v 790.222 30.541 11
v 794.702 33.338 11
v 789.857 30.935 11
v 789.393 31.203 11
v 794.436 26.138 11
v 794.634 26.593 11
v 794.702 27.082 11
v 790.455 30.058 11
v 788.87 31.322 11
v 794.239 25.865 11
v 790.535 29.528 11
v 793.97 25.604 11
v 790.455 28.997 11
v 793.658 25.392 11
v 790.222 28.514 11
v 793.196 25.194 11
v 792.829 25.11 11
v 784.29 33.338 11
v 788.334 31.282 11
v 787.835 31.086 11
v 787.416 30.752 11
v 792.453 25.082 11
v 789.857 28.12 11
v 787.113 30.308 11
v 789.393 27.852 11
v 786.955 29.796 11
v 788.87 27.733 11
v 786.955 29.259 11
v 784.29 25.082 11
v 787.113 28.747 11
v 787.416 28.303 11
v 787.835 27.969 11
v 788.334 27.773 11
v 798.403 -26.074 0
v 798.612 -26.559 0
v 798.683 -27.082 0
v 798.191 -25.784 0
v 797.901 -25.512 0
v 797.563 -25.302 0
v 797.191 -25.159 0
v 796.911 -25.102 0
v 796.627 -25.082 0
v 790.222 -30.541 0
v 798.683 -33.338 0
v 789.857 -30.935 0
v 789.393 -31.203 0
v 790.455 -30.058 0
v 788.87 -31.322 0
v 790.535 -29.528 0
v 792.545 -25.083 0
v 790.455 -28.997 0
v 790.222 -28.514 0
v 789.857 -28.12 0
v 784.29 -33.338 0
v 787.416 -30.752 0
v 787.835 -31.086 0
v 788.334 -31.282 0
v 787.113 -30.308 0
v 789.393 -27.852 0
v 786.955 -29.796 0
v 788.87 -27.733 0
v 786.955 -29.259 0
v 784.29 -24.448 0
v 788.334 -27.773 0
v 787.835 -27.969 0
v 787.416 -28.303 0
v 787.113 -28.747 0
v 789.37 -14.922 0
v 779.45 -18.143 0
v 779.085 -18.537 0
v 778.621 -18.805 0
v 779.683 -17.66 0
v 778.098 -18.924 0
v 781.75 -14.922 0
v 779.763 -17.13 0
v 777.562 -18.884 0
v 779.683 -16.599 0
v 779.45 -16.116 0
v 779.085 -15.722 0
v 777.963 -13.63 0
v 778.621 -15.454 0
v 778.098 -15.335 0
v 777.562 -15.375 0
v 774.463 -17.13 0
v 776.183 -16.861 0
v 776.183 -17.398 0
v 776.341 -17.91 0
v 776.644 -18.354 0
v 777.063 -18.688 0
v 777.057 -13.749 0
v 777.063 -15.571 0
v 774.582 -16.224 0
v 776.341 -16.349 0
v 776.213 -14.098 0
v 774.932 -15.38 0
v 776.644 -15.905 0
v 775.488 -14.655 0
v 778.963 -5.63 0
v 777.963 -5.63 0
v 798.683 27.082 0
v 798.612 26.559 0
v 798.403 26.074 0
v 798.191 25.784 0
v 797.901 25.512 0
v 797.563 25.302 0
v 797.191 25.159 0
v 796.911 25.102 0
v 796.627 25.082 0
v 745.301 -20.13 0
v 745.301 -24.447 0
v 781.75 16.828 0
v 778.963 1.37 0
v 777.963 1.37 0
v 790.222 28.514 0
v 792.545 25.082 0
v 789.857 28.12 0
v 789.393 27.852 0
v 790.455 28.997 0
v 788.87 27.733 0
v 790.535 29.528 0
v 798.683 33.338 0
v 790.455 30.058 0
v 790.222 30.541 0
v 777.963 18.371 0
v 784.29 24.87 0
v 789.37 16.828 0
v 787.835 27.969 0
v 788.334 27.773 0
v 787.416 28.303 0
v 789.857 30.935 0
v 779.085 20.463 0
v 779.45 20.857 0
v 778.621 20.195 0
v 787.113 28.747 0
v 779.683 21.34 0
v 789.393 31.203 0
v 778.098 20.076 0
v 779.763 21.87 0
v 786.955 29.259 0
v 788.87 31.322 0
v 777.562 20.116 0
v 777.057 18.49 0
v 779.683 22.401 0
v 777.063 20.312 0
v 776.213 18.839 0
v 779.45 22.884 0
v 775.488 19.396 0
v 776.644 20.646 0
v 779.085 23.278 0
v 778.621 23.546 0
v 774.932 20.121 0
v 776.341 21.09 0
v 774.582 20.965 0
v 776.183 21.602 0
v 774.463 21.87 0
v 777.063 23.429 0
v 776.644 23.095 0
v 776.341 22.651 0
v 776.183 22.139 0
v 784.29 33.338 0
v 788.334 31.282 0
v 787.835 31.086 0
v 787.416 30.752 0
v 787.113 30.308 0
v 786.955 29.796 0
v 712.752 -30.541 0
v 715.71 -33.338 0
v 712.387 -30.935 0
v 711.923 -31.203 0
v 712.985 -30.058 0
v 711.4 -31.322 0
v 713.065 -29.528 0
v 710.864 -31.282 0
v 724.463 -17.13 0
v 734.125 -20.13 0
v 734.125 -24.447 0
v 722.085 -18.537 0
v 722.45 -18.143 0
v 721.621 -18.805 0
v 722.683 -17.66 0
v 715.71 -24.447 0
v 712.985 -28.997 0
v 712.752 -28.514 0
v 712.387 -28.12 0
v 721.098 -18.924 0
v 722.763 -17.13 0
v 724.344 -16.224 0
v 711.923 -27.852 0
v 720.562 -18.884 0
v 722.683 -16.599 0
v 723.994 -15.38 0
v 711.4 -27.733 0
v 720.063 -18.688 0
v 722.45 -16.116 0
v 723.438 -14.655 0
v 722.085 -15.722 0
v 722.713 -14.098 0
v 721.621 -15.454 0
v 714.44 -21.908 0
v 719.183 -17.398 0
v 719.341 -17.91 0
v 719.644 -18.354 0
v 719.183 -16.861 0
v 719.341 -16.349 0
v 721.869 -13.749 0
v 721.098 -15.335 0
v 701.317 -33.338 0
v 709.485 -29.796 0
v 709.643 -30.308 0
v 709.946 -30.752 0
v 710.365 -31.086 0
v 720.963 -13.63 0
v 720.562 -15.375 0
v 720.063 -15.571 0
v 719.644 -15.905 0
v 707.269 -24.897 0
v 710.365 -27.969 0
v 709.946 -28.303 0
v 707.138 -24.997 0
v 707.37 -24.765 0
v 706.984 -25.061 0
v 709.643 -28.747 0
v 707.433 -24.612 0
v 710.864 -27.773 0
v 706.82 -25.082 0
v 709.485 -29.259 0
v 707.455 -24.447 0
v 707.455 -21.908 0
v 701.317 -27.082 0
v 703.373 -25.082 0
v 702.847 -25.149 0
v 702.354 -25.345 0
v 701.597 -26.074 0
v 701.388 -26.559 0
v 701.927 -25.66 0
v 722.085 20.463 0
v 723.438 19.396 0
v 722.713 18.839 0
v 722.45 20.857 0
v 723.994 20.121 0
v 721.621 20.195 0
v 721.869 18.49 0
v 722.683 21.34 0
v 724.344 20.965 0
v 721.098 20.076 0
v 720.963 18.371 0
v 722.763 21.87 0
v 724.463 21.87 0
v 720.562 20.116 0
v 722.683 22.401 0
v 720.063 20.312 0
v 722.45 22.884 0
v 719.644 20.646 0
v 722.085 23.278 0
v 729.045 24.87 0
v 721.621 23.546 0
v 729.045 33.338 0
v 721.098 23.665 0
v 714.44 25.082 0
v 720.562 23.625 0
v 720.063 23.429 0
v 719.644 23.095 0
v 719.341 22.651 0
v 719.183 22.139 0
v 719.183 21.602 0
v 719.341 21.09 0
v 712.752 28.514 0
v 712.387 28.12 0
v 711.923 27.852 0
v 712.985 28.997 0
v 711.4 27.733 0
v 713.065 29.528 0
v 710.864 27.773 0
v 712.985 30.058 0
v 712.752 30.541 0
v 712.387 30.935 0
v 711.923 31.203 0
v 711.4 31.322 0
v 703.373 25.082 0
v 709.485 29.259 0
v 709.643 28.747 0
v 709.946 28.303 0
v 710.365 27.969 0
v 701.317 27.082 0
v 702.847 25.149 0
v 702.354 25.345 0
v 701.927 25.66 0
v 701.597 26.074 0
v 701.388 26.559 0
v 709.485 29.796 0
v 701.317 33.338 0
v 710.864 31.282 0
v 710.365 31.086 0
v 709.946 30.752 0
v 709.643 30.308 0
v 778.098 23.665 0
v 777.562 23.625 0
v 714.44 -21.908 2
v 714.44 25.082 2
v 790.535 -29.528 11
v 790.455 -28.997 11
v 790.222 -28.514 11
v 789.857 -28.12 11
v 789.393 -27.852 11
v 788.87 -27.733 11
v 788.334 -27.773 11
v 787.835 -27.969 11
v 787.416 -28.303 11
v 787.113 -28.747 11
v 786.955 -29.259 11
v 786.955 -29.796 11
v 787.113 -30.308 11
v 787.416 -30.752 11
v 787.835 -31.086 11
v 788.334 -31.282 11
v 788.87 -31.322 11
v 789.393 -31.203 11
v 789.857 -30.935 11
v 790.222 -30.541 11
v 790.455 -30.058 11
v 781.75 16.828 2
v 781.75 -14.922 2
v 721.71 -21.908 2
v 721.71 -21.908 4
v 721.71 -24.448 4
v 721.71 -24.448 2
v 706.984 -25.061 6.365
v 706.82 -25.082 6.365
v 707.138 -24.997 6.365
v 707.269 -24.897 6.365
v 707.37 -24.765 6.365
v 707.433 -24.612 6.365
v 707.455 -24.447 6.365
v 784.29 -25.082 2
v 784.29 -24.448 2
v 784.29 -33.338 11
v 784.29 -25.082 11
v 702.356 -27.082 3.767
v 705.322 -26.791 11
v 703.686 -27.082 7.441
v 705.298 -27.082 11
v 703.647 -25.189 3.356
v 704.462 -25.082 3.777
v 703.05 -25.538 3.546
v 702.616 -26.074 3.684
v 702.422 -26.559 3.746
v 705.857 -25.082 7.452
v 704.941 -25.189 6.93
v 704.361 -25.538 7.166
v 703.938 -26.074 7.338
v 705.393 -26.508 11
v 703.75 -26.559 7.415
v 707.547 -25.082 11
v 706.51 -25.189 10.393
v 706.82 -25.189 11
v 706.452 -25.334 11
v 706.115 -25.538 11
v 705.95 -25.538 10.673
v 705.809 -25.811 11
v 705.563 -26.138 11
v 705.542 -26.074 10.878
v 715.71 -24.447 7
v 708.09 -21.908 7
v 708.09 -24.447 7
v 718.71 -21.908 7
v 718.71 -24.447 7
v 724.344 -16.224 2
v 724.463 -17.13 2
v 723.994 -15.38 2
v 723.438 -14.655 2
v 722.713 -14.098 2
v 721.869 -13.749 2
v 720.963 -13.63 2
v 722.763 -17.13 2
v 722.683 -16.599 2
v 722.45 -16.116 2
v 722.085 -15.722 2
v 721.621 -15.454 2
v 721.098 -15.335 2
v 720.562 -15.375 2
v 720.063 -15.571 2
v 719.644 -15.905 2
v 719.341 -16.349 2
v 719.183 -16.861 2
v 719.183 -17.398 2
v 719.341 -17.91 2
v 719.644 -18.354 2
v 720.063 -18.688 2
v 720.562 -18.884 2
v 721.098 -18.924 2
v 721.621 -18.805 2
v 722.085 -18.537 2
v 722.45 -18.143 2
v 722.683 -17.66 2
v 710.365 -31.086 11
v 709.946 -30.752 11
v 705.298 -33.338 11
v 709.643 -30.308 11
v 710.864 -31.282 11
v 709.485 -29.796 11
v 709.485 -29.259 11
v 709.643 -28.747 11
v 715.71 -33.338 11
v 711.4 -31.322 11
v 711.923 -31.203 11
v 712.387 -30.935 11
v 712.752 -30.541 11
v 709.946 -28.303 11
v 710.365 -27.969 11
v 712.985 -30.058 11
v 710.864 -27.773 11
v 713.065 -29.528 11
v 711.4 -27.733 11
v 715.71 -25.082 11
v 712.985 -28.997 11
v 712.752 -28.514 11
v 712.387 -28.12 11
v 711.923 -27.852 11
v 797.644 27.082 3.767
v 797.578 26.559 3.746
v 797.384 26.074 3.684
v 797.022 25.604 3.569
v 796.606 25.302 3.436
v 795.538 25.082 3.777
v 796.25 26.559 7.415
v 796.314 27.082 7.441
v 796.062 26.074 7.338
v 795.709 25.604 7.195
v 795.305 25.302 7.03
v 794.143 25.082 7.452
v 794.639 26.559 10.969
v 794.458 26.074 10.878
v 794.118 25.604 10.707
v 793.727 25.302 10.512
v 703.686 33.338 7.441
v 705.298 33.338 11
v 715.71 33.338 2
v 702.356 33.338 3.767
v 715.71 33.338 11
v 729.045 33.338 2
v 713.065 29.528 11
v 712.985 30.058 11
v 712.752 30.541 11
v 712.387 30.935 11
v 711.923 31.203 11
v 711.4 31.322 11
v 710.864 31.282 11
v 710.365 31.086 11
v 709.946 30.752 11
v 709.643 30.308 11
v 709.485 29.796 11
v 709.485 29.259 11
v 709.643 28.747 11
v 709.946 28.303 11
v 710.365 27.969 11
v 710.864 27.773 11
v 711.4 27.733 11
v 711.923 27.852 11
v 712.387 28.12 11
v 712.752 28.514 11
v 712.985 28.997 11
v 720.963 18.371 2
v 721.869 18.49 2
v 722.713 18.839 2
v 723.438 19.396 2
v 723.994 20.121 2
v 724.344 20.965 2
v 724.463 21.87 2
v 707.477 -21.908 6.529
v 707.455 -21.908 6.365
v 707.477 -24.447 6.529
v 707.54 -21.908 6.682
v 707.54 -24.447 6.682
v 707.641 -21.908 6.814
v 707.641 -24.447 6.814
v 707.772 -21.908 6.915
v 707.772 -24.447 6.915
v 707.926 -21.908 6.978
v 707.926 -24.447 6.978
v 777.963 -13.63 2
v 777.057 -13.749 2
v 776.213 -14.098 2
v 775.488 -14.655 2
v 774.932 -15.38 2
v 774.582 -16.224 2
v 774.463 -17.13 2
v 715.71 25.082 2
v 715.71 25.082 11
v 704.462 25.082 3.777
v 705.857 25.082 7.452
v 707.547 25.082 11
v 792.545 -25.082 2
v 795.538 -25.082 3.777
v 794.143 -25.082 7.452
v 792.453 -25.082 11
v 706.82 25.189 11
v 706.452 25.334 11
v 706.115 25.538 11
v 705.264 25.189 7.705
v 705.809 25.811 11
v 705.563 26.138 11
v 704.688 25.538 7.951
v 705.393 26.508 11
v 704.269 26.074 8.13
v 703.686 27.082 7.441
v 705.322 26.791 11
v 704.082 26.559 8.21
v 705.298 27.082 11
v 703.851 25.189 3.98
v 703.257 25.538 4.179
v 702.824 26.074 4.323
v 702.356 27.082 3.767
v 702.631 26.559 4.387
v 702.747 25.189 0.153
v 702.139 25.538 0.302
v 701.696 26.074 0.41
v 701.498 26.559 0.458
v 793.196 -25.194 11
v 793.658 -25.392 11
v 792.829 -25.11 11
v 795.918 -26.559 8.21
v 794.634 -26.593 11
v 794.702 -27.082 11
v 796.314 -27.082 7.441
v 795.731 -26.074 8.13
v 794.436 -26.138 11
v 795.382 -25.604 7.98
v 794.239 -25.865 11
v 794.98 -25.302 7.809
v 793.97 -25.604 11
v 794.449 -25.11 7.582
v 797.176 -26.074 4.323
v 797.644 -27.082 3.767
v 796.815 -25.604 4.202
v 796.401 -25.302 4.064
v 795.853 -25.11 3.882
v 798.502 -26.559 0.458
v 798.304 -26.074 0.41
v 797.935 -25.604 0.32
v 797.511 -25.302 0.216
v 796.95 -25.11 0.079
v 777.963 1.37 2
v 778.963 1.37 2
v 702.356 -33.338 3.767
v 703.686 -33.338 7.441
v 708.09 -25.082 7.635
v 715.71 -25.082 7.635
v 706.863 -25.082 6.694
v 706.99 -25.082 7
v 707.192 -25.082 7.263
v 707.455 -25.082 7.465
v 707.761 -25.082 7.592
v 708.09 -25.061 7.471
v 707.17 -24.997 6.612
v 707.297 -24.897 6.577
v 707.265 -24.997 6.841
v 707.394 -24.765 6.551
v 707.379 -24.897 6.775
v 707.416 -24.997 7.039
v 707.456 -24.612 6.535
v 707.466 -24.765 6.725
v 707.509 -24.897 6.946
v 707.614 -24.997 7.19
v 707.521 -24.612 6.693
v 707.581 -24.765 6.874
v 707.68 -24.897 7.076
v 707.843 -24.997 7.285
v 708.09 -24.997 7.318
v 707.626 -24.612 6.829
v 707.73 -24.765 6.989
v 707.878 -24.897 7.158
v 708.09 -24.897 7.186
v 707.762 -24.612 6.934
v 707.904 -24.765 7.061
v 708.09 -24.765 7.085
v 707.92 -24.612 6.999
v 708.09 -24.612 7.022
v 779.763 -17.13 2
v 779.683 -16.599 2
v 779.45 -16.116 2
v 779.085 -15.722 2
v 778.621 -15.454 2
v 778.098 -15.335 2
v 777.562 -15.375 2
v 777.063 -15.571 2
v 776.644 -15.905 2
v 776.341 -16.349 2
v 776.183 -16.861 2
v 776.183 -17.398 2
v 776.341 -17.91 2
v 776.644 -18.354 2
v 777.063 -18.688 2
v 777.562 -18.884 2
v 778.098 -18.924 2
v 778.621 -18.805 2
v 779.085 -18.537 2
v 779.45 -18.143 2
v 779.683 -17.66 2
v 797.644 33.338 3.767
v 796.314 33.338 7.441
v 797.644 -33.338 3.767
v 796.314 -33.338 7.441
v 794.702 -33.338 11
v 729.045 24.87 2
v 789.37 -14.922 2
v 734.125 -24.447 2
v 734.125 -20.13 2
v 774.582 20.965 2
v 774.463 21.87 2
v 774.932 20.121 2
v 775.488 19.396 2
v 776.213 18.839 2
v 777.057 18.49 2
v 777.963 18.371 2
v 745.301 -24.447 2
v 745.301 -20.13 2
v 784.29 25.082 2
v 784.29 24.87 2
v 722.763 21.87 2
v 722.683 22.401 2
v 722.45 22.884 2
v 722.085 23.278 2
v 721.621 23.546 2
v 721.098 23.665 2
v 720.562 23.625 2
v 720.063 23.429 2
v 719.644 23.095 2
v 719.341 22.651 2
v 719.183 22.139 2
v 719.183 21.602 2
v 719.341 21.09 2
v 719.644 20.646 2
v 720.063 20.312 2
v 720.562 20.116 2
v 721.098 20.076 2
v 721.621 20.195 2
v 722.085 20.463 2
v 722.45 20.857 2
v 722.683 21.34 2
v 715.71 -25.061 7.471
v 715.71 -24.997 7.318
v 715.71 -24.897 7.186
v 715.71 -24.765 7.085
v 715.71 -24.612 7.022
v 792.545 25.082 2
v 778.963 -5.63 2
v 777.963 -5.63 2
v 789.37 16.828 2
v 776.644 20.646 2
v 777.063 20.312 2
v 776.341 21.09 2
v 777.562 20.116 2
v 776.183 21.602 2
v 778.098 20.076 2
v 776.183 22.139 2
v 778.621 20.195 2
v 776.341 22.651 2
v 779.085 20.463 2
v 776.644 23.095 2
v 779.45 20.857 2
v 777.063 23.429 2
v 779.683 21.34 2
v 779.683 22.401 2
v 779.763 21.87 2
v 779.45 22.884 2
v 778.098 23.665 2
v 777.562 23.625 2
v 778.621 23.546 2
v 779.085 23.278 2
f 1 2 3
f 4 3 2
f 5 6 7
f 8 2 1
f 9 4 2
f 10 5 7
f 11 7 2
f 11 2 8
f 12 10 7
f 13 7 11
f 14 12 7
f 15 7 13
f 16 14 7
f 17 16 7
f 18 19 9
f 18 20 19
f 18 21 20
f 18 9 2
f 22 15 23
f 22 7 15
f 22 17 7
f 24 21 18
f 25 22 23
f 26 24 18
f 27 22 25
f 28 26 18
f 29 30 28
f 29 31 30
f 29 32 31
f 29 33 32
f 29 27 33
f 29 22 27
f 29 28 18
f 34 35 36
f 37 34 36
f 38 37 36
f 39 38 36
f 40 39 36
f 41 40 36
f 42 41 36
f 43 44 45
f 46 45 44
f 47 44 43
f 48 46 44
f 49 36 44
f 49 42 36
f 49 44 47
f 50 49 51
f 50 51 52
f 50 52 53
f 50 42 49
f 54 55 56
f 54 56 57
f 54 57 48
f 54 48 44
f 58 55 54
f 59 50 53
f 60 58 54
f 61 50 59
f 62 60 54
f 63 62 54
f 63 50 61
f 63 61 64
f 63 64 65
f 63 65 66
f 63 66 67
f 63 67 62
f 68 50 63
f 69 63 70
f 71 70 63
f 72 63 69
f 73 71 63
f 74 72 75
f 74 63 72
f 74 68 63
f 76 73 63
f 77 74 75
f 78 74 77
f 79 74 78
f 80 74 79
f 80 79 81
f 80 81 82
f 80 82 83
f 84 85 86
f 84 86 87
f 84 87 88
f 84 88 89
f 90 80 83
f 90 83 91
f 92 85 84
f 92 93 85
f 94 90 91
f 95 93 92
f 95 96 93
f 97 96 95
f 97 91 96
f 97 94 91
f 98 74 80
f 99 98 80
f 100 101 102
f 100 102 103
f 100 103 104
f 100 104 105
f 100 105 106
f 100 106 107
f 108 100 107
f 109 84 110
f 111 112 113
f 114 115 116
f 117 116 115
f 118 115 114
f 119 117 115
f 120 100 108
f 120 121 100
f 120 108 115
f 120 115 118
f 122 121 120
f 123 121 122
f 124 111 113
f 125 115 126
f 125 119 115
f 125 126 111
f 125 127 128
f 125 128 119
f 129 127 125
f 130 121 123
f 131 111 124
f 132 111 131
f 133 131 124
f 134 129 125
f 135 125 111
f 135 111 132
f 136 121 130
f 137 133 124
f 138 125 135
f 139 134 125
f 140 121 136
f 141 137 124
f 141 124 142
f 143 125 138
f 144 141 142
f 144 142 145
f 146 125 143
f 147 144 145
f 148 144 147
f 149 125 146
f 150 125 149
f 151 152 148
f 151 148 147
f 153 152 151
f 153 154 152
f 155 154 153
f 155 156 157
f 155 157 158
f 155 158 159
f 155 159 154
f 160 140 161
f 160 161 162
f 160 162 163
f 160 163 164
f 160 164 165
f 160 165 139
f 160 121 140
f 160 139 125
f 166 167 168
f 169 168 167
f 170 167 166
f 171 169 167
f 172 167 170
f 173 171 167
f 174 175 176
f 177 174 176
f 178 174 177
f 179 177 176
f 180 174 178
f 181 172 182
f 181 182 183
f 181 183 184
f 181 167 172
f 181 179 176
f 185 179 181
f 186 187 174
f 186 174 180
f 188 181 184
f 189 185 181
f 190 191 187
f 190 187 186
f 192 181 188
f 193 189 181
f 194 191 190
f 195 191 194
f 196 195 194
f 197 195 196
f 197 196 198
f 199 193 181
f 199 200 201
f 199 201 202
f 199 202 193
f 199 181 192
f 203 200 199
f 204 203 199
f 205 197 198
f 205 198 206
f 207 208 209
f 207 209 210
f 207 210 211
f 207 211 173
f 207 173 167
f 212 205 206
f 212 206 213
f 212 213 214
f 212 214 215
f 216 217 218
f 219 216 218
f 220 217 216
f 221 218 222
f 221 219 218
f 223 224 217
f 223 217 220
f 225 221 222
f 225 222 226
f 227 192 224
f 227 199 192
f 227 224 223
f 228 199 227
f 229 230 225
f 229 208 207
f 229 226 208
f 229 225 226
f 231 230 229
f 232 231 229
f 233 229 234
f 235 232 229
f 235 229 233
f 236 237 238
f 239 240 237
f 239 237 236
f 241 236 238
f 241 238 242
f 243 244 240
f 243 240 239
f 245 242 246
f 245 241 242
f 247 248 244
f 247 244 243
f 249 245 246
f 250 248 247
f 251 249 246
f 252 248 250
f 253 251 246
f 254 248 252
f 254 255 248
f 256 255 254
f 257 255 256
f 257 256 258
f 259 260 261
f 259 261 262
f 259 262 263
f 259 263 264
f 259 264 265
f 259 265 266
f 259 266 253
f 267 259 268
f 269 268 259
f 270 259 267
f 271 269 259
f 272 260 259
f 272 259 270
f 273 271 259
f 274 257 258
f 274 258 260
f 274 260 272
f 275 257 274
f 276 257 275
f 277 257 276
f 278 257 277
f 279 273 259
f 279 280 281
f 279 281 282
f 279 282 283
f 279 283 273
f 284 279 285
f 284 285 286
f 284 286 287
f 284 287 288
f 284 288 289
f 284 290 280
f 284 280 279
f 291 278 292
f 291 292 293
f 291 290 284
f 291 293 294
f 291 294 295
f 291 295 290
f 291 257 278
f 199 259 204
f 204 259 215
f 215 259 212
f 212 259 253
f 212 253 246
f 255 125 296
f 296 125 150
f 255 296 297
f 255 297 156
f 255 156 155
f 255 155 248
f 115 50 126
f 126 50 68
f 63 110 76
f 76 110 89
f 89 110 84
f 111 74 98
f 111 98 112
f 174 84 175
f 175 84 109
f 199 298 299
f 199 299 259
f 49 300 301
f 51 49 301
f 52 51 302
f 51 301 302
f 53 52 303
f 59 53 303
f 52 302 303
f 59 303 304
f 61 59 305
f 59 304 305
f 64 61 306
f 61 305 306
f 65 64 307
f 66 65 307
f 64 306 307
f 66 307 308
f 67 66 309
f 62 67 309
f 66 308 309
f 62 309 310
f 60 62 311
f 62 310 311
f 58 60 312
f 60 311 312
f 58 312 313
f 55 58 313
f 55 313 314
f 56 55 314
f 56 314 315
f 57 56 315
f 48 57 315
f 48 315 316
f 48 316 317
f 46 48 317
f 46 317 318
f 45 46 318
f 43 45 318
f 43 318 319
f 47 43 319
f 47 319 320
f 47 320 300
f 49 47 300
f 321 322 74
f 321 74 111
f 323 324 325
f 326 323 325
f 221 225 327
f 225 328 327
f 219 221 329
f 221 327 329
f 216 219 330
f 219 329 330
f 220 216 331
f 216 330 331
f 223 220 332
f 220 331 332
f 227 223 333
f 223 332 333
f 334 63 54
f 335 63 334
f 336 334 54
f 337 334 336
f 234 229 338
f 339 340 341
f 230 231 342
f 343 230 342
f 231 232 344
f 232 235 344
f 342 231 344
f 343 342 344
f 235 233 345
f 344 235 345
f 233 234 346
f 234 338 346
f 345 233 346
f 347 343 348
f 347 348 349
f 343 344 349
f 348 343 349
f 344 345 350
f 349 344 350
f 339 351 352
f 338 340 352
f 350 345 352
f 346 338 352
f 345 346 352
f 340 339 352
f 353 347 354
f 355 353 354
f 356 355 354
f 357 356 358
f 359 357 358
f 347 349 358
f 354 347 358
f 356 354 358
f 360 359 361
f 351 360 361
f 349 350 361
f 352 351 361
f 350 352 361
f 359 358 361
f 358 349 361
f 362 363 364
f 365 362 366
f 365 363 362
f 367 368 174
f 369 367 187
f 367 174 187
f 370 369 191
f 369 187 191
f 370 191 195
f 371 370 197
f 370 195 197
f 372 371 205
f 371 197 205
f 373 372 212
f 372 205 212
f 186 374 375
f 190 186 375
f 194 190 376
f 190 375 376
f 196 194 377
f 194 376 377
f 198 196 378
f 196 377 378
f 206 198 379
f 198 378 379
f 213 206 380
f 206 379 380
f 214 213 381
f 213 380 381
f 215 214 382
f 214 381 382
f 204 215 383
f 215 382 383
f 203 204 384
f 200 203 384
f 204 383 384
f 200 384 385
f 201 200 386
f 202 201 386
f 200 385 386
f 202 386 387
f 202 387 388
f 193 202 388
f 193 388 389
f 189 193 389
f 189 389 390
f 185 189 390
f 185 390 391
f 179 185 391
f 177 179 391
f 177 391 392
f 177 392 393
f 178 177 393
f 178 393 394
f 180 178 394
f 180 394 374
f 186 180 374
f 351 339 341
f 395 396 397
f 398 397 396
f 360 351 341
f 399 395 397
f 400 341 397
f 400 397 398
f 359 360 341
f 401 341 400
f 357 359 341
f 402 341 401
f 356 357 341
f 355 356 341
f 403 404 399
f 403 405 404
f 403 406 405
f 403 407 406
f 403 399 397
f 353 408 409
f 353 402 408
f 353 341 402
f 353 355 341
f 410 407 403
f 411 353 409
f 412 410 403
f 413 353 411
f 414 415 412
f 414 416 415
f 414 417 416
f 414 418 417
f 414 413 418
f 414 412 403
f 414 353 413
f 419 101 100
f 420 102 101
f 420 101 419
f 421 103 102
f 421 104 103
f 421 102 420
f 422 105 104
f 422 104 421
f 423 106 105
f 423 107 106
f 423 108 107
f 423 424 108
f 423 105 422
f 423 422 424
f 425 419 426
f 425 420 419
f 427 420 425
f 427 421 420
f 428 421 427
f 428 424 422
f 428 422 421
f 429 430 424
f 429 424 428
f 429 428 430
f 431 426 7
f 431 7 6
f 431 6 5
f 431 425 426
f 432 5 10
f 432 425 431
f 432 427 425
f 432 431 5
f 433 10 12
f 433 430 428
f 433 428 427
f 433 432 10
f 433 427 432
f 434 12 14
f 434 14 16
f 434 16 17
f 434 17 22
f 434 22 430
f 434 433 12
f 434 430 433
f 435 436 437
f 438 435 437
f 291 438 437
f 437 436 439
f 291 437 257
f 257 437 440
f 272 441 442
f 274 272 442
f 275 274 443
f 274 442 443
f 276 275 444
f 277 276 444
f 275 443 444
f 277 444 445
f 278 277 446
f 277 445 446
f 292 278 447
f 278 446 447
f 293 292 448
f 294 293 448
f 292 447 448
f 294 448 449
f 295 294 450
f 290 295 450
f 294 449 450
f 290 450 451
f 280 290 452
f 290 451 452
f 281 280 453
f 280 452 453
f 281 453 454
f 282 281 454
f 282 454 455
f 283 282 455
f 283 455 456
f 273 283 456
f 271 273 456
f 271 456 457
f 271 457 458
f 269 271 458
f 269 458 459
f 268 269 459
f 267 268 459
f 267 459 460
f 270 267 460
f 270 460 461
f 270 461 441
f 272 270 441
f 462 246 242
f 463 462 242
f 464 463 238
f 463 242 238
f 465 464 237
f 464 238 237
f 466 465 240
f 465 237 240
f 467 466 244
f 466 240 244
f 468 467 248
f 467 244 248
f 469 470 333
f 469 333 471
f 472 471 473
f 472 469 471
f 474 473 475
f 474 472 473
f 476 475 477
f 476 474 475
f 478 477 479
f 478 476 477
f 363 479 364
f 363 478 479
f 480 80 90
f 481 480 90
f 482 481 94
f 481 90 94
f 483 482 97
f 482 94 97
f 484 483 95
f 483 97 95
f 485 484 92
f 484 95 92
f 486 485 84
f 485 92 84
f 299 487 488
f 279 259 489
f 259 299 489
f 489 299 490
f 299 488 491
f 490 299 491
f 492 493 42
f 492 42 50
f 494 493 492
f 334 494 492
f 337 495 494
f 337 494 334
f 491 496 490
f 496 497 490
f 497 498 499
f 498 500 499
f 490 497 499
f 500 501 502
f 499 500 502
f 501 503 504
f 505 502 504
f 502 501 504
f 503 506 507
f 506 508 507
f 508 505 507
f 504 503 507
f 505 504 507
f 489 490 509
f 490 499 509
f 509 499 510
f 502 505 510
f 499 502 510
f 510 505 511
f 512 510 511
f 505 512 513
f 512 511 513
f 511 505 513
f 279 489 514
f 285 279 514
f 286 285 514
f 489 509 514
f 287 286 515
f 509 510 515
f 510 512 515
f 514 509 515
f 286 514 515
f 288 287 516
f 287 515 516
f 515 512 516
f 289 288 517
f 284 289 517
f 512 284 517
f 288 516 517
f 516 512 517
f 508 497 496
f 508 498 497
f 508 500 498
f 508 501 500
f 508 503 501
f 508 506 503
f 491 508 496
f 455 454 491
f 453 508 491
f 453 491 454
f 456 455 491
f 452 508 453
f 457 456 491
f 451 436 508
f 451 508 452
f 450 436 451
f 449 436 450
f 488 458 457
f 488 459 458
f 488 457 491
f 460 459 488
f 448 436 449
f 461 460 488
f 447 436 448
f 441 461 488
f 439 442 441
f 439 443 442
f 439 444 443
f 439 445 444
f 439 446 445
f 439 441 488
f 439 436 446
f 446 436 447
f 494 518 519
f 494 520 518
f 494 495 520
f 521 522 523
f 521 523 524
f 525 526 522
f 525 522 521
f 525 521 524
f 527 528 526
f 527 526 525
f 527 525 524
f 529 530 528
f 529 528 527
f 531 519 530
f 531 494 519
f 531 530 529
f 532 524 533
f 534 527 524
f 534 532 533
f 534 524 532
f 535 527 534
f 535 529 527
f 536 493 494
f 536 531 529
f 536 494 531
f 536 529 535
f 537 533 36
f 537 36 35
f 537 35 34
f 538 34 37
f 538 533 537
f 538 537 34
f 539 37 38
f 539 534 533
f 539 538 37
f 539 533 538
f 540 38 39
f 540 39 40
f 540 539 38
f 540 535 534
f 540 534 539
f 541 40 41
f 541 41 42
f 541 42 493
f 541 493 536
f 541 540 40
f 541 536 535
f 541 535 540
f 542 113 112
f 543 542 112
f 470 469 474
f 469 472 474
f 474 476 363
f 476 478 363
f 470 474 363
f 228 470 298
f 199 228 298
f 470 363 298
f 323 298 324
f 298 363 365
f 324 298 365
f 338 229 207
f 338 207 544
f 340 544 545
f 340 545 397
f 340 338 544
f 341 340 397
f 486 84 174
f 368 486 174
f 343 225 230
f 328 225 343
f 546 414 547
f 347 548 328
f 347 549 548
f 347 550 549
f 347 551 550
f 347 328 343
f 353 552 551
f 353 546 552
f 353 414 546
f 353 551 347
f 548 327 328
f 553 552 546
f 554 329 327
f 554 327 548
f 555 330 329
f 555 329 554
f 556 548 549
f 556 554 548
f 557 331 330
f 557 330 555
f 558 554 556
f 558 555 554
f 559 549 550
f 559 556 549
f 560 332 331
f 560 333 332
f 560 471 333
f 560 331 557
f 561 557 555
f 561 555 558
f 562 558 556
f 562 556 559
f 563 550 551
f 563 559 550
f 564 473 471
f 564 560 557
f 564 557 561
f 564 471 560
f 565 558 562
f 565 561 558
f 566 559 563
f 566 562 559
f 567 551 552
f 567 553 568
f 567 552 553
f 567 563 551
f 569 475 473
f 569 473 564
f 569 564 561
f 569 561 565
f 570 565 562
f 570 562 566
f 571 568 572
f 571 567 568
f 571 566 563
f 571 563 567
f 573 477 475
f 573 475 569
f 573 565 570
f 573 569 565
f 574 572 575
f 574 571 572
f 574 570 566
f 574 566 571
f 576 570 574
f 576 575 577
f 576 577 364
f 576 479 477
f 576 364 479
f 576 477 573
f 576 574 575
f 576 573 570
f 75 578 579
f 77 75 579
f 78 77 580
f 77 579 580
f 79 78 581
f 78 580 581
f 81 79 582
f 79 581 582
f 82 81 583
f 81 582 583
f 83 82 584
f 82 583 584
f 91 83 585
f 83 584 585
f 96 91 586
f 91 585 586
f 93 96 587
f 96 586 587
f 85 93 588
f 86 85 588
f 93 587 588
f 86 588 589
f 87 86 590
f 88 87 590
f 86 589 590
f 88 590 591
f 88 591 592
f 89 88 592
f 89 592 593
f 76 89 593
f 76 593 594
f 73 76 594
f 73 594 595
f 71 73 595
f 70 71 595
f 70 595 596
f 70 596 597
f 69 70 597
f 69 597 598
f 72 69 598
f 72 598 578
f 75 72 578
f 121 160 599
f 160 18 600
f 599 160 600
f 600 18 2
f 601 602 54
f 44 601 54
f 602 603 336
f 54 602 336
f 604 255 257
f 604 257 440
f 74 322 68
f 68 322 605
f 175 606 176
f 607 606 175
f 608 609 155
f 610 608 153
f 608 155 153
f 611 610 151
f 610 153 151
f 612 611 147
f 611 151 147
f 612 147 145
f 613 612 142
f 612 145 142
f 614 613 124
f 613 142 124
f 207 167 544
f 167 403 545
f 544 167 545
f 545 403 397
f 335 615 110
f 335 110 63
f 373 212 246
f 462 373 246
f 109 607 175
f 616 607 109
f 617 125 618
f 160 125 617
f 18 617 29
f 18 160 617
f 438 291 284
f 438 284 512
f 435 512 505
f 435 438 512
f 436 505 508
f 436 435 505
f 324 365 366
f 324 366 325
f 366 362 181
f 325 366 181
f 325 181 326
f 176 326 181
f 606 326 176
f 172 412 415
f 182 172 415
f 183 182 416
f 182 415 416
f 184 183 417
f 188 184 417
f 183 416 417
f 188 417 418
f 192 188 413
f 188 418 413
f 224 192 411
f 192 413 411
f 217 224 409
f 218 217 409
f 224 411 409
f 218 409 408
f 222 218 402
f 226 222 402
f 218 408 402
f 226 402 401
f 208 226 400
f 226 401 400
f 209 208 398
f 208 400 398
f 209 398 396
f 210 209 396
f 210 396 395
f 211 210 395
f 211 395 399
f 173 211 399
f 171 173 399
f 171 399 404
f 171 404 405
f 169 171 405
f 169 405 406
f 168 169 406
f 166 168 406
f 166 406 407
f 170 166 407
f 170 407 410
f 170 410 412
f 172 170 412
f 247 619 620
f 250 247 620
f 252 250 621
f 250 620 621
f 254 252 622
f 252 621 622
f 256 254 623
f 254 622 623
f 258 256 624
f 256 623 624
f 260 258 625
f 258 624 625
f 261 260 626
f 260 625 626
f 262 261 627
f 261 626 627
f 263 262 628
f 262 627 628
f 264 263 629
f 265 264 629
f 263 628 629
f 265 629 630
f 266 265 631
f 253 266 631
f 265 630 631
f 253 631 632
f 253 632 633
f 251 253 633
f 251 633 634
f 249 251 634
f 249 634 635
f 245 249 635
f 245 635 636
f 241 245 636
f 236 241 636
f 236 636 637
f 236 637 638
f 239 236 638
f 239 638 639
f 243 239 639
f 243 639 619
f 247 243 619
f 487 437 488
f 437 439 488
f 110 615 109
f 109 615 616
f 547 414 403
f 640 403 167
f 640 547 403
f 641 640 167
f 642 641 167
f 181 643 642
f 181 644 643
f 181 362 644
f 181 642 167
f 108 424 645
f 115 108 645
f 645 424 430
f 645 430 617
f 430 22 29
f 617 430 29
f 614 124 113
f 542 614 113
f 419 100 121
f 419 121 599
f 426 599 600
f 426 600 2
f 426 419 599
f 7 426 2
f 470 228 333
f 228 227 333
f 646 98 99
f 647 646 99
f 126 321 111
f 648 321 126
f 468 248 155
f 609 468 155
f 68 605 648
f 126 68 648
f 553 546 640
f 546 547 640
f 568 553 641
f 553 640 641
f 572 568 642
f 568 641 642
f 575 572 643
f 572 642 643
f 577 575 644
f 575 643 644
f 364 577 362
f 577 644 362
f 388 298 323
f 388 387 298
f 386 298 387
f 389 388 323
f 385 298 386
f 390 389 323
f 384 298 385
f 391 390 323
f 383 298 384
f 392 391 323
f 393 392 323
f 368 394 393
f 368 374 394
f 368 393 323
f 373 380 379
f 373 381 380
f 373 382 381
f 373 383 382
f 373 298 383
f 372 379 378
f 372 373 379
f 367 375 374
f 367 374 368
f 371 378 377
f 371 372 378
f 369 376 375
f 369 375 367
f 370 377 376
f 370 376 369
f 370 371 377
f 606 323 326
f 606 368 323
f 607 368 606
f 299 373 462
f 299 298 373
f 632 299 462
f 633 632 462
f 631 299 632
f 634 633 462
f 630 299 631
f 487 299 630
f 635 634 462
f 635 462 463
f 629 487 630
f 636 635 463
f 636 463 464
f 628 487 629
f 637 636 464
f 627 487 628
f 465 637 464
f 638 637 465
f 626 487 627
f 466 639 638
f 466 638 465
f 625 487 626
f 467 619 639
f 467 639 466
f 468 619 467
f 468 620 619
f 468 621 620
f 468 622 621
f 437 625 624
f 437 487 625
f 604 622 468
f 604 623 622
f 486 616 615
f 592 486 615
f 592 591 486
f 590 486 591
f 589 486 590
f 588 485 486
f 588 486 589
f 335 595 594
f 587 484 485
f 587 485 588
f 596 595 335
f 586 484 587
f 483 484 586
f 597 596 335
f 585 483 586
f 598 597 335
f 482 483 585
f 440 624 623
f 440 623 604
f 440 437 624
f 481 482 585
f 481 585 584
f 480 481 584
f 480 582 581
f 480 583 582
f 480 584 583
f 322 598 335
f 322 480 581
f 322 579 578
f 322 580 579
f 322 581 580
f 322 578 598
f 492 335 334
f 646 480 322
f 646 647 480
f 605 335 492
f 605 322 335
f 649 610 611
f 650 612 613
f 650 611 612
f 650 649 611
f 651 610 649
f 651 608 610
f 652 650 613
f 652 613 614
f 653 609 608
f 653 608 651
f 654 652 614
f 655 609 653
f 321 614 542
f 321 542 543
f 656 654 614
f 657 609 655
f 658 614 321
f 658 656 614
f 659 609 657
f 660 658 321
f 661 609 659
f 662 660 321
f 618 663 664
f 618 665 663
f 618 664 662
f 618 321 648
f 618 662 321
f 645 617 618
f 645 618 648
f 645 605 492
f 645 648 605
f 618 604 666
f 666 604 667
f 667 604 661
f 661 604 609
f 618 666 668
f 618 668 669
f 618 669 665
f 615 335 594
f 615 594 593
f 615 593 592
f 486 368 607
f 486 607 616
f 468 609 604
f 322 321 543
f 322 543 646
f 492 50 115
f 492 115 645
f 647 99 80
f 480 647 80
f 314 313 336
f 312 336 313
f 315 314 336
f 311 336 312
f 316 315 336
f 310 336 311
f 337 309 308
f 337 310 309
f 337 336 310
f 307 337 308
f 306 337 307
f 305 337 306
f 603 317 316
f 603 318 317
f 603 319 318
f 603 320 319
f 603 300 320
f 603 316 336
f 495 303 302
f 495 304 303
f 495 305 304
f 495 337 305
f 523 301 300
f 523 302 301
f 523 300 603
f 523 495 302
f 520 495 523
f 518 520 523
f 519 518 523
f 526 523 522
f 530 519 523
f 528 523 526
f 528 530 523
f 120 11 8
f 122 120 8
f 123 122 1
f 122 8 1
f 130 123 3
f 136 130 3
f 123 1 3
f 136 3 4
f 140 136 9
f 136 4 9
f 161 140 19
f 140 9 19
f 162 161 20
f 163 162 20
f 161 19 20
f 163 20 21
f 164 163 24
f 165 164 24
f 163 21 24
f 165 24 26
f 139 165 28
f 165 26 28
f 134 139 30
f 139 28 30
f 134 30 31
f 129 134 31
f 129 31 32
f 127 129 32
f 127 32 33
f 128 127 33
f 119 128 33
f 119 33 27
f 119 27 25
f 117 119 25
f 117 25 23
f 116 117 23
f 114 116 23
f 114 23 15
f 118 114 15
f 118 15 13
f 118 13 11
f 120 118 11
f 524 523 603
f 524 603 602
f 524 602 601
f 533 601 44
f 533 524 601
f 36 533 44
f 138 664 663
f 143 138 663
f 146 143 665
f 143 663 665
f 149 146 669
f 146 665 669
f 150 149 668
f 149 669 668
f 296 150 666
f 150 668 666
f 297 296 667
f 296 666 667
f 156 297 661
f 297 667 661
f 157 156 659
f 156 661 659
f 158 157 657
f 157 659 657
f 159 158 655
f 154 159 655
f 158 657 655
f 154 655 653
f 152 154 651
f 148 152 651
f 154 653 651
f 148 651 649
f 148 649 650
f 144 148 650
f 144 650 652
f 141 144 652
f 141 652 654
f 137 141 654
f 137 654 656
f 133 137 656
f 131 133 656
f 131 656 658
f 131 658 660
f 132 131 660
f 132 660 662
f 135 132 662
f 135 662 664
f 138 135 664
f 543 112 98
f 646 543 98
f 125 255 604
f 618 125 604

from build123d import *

# Parameters (mm, degrees)
EXTRUDE_1_DEPTH             = 8.255
EXTRUDE_2_DEPTH             = 50.165
CUT_EXTRUDE_1_DEPTH         = 50.165
EXTRUDE_3_DEPTH             = 8.255
CUT_EXTRUDE_2_DEPTH         = 8.255
CUT_EXTRUDE_3_DEPTH         = 8.255
CUT_EXTRUDE_4_DEPTH         = 55.245
CUT_EXTRUDE_5_DEPTH         = 0.635
CUT_EXTRUDE_6_DEPTH         = 46.99
SKETCH_10_W                 = 8.255
SKETCH_10_H                 = 4
EXTRUDE_4_DEPTH             = 0.635
CUT_EXTRUDE_7_DEPTH         = 2
EXTRUDE_5_DEPTH             = 8.255
SKETCH_13_W                 = 11.176
SKETCH_13_H                 = 4.318
CUT_EXTRUDE_8_DEPTH         = 3
CUT_EXTRUDE_9_DEPTH         = 12
SKETCH_15_W                 = 7.62
SKETCH_15_H                 = 31.75
CUT_EXTRUDE_10_DEPTH        = 3
HOLE_WIZARD_3_6_3_6_1_D     = 3.6
HOLE_WIZARD_3_6_3_6_1_DEPTH = 11
HOLE_WIZARD_3_6_3_6_2_D     = 3.6
HOLE_WIZARD_3_6_3_6_2_DEPTH = 11
FILLET_1_R                  = 0.635
FILLET_2_R                  = 2


with BuildPart() as part:
    # 草图1 → 凸台-拉伸1 (new body)
    with BuildSketch(Plane.XZ.offset(-25.0825)):
        with BuildLine():
            Line((729.045, 11), (729.045, 4))
            Line((729.045, 4), (721.71, 4))
            Line((721.71, 4), (718.71, 7))
            Line((718.71, 7), (715.71, 7))
            Line((715.71, 7), (715.71, 11))
            Line((715.71, 11), (705.298322179, 11))
            ThreePointArc((705.298322179, 11), (702.984819943, 5.616840019), (701.316943399, 0))
            Line((701.316943399, 0), (798.683056601, 0))
            ThreePointArc((798.683056601, 0), (797.015180057, 5.616840019), (794.701677821, 11))
            Line((794.701677821, 11), (729.045, 11))
        make_face()
    extrude(amount=-EXTRUDE_1_DEPTH)

    # 草图2 → 凸台-拉伸2 (add)
    with BuildSketch(Plane.XZ.offset(-25.0825)):
        with BuildLine():
            Line((705.298322179, 11), (715.71, 11))
            Line((715.71, 11), (715.71, 7))
            Line((715.71, 7), (718.71, 7))
            Line((718.71, 7), (721.71, 4))
            Line((721.71, 4), (792.545, 4))
            Line((792.545, 4), (792.545, 0))
            Line((792.545, 0), (701.316943399, 0))
            ThreePointArc((701.316943399, 0), (702.984819943, 5.616840019), (705.298322179, 11))
        make_face()
    extrude(amount=EXTRUDE_2_DEPTH)

    # 草图3 → 切除-拉伸1 (cut)
    with BuildSketch(Plane.XZ.offset(25.0825)):
        with BuildLine():
            Line((701.316943399, 0), (707.455, 0))
            Line((707.455, 0), (707.455, 7))
            Line((707.455, 7), (715.71, 7))
            Line((715.71, 7), (715.71, 11))
            Line((715.71, 11), (705.298322179, 11))
            ThreePointArc((705.298322179, 11), (702.984819943, 5.616840019), (701.316943399, 0))
        make_face()
    extrude(amount=-CUT_EXTRUDE_1_DEPTH, mode=Mode.SUBTRACT)

    # 草图4 → 凸台-拉伸3 (add)
    with BuildSketch(Plane.XZ.offset(25.0825)):
        with BuildLine():
            Line((705.298322179, 11), (715.71, 11))
            Line((715.71, 11), (715.71, 7))
            Line((715.71, 7), (718.71, 7))
            Line((718.71, 7), (721.71, 4))
            Line((721.71, 4), (792.545, 4))
            Line((792.545, 4), (792.545, 0))
            Line((792.545, 0), (701.316943399, 0))
            ThreePointArc((701.316943399, 0), (702.984819943, 5.616840019), (705.298322179, 11))
        make_face()
    extrude(amount=EXTRUDE_3_DEPTH)

    # 草图5 → 切除-拉伸2 (cut)
    with BuildSketch(Plane(origin=(0, 33.3375, 0), x_dir=(-1, 0, 0), z_dir=(0, 1, 0))):
        Polygon((-721.71, 4), (-715.71, 4), (-715.71, 7), (-718.71, 7), align=None)
    extrude(amount=-CUT_EXTRUDE_2_DEPTH, mode=Mode.SUBTRACT)

    # 草图6 → 切除-拉伸3 (cut)
    with BuildSketch(Plane.XZ.offset(33.3375)):
        Polygon((715.71, 0), (792.545, 0), (792.545, 4), (721.71, 4), (718.71, 7), (715.71, 7), align=None)
    extrude(amount=-CUT_EXTRUDE_3_DEPTH, mode=Mode.SUBTRACT)

    # 草图7 → 切除-拉伸4 (cut)
    with BuildSketch(Plane.ZY.offset(-729.045)):
        Polygon((0, 33.3375), (0, 24.8705), (4, 24.8705), (4, 25.0825), (11, 25.0825), (11, 33.3375), align=None)
    extrude(amount=-CUT_EXTRUDE_4_DEPTH, mode=Mode.SUBTRACT)

    # 草图8 → 切除-拉伸5 (cut)
    with BuildSketch(Plane.XZ.offset(25.0825)):
        Polygon((715.71, 0), (792.545, 0), (792.545, 4), (721.71, 4), (718.71, 7), (715.71, 7), align=None)
    extrude(amount=-CUT_EXTRUDE_5_DEPTH, mode=Mode.SUBTRACT)

    # 草图9 → 切除-拉伸6 (cut)
    with BuildSketch(Plane(origin=(0, 25.0825, 0), x_dir=(-1, 0, 0), z_dir=(0, 1, 0))):
        Polygon((-721.71, 4), (-714.44, 4), (-714.44, 0), (-707.455, 0), (-707.455, 7), (-718.71, 7), align=None)
    extrude(amount=-CUT_EXTRUDE_6_DEPTH, mode=Mode.SUBTRACT)

    # 草图10 → 凸台-拉伸4 (add)
    with BuildSketch(Plane.XZ.offset(24.4475)):
        with Locations((788.4175, 2)):
            Rectangle(SKETCH_10_W, SKETCH_10_H)
    extrude(amount=EXTRUDE_4_DEPTH)

    # 草图11 → 切除-拉伸7 (cut)
    with BuildSketch(Plane.XY.offset(4)):
        Polygon((784.29, 25.0825), (784.29, 24.8705), (729.045, 24.8705), (729.045, 33.3375), (715.71, 33.3375), (715.71, 25.0825), (714.44, 25.0825), (714.44, -21.9075), (721.71, -21.9075), (721.71, -24.4475), (784.29, -24.4475), (784.29, -25.0825), (792.545, -25.0825), (792.545, 25.0825), align=None)
    extrude(amount=-CUT_EXTRUDE_7_DEPTH, mode=Mode.SUBTRACT)

    # 草图12 → 凸台-拉伸5 (add)
    with BuildSketch(Plane.XZ.offset(25.0825)):
        with BuildLine():
            Line((798.683056601, 0), (784.29, 0))
            Line((784.29, 0), (784.29, 11))
            Line((784.29, 11), (794.701677821, 11))
            ThreePointArc((794.701677821, 11), (797.015180057, 5.616840019), (798.683056601, 0))
        make_face()
    extrude(amount=EXTRUDE_5_DEPTH)

    # 草图13 → 切除-拉伸8 (cut, through all)
    with BuildSketch(Plane.XY.offset(2)):
        with Locations((739.713, -22.2885)):
            Rectangle(SKETCH_13_W, SKETCH_13_H)
    extrude(amount=-CUT_EXTRUDE_8_DEPTH, mode=Mode.SUBTRACT)

    # 草图14 → 切除-拉伸9 (cut, through all)
    with BuildSketch(Plane(origin=(0, 0, 0), x_dir=(-1, 0, 0), z_dir=(0, 0, -1))):
        with BuildLine():
            Line((-777.963, 18.3705), (-777.963, 1.3705))
            Line((-777.963, 1.3705), (-778.963, 1.3705))
            Line((-778.963, 1.3705), (-778.963, -5.6295))
            Line((-778.963, -5.6295), (-777.963, -5.6295))
            Line((-777.963, -5.6295), (-777.963, -13.6295))
            ThreePointArc((-777.963, -13.6295), (-775.488126266, -14.654626266), (-774.463, -17.1295))
            Line((-774.463, -17.1295), (-724.463, -17.1295))
            ThreePointArc((-724.463, -17.1295), (-723.437873734, -14.654626266), (-720.963, -13.6295))
            Line((-720.963, -13.6295), (-720.963, 18.3705))
            ThreePointArc((-720.963, 18.3705), (-723.437873734, 19.395626266), (-724.463, 21.8705))
            Line((-724.463, 21.8705), (-774.463, 21.8705))
            ThreePointArc((-774.463, 21.8705), (-775.488126266, 19.395626266), (-777.963, 18.3705))
        make_face()
    extrude(amount=-CUT_EXTRUDE_9_DEPTH, mode=Mode.SUBTRACT)

    # 草图15 → 切除-拉伸10 (cut, through all)
    with BuildSketch(Plane.XY.offset(2)):
        with Locations((785.56, 0.9525)):
            Rectangle(SKETCH_15_W, SKETCH_15_H)
    extrude(amount=-CUT_EXTRUDE_10_DEPTH, mode=Mode.SUBTRACT)

    # Ø3.6 (3.6) 直径孔1
    with Locations(Plane(origin=(0, 0, 0), x_dir=(-1, 0, 0), z_dir=(0, 0, -1))):
        with Locations((-711.265, 29.5275), (-788.735, 29.5275), (-788.735, -29.5275), (-711.265, -29.5275)):
            Hole(HOLE_WIZARD_3_6_3_6_1_D / 2, depth=HOLE_WIZARD_3_6_3_6_1_DEPTH)

    # Ø3.6 (3.6) 直径孔2
    with Locations(Plane(origin=(0, 0, 0), x_dir=(-1, 0, 0), z_dir=(0, 0, -1))):
        with Locations((-720.963, -17.1295), (-720.963, 21.8705), (-777.963, 21.8705), (-777.963, -17.1295)):
            Hole(HOLE_WIZARD_3_6_3_6_2_D / 2, depth=HOLE_WIZARD_3_6_3_6_2_DEPTH)

    # 圆角1
    fillet_1_edges = [part.edges().sort_by_distance(p)[0] for p in [
        (711.5825, -25.0825, 7),
        (707.455, -23.495, 7),
        (707.455, -25.0825, 3.5),
    ]]
    fillet(fillet_1_edges, radius=FILLET_1_R)

    # 圆角2
    fillet_2_edges = [part.edges().sort_by_distance(p)[0] for p in [
        (797.015180057, -25.0825, 5.616840019),
        (702.984819943, 25.0825, 5.616840019),
        (702.984819943, -25.0825, 5.616840019),
        (797.015180057, 25.0825, 5.616840019),
    ]]
    fillet(fillet_2_edges, radius=FILLET_2_R)


solid = part.part
